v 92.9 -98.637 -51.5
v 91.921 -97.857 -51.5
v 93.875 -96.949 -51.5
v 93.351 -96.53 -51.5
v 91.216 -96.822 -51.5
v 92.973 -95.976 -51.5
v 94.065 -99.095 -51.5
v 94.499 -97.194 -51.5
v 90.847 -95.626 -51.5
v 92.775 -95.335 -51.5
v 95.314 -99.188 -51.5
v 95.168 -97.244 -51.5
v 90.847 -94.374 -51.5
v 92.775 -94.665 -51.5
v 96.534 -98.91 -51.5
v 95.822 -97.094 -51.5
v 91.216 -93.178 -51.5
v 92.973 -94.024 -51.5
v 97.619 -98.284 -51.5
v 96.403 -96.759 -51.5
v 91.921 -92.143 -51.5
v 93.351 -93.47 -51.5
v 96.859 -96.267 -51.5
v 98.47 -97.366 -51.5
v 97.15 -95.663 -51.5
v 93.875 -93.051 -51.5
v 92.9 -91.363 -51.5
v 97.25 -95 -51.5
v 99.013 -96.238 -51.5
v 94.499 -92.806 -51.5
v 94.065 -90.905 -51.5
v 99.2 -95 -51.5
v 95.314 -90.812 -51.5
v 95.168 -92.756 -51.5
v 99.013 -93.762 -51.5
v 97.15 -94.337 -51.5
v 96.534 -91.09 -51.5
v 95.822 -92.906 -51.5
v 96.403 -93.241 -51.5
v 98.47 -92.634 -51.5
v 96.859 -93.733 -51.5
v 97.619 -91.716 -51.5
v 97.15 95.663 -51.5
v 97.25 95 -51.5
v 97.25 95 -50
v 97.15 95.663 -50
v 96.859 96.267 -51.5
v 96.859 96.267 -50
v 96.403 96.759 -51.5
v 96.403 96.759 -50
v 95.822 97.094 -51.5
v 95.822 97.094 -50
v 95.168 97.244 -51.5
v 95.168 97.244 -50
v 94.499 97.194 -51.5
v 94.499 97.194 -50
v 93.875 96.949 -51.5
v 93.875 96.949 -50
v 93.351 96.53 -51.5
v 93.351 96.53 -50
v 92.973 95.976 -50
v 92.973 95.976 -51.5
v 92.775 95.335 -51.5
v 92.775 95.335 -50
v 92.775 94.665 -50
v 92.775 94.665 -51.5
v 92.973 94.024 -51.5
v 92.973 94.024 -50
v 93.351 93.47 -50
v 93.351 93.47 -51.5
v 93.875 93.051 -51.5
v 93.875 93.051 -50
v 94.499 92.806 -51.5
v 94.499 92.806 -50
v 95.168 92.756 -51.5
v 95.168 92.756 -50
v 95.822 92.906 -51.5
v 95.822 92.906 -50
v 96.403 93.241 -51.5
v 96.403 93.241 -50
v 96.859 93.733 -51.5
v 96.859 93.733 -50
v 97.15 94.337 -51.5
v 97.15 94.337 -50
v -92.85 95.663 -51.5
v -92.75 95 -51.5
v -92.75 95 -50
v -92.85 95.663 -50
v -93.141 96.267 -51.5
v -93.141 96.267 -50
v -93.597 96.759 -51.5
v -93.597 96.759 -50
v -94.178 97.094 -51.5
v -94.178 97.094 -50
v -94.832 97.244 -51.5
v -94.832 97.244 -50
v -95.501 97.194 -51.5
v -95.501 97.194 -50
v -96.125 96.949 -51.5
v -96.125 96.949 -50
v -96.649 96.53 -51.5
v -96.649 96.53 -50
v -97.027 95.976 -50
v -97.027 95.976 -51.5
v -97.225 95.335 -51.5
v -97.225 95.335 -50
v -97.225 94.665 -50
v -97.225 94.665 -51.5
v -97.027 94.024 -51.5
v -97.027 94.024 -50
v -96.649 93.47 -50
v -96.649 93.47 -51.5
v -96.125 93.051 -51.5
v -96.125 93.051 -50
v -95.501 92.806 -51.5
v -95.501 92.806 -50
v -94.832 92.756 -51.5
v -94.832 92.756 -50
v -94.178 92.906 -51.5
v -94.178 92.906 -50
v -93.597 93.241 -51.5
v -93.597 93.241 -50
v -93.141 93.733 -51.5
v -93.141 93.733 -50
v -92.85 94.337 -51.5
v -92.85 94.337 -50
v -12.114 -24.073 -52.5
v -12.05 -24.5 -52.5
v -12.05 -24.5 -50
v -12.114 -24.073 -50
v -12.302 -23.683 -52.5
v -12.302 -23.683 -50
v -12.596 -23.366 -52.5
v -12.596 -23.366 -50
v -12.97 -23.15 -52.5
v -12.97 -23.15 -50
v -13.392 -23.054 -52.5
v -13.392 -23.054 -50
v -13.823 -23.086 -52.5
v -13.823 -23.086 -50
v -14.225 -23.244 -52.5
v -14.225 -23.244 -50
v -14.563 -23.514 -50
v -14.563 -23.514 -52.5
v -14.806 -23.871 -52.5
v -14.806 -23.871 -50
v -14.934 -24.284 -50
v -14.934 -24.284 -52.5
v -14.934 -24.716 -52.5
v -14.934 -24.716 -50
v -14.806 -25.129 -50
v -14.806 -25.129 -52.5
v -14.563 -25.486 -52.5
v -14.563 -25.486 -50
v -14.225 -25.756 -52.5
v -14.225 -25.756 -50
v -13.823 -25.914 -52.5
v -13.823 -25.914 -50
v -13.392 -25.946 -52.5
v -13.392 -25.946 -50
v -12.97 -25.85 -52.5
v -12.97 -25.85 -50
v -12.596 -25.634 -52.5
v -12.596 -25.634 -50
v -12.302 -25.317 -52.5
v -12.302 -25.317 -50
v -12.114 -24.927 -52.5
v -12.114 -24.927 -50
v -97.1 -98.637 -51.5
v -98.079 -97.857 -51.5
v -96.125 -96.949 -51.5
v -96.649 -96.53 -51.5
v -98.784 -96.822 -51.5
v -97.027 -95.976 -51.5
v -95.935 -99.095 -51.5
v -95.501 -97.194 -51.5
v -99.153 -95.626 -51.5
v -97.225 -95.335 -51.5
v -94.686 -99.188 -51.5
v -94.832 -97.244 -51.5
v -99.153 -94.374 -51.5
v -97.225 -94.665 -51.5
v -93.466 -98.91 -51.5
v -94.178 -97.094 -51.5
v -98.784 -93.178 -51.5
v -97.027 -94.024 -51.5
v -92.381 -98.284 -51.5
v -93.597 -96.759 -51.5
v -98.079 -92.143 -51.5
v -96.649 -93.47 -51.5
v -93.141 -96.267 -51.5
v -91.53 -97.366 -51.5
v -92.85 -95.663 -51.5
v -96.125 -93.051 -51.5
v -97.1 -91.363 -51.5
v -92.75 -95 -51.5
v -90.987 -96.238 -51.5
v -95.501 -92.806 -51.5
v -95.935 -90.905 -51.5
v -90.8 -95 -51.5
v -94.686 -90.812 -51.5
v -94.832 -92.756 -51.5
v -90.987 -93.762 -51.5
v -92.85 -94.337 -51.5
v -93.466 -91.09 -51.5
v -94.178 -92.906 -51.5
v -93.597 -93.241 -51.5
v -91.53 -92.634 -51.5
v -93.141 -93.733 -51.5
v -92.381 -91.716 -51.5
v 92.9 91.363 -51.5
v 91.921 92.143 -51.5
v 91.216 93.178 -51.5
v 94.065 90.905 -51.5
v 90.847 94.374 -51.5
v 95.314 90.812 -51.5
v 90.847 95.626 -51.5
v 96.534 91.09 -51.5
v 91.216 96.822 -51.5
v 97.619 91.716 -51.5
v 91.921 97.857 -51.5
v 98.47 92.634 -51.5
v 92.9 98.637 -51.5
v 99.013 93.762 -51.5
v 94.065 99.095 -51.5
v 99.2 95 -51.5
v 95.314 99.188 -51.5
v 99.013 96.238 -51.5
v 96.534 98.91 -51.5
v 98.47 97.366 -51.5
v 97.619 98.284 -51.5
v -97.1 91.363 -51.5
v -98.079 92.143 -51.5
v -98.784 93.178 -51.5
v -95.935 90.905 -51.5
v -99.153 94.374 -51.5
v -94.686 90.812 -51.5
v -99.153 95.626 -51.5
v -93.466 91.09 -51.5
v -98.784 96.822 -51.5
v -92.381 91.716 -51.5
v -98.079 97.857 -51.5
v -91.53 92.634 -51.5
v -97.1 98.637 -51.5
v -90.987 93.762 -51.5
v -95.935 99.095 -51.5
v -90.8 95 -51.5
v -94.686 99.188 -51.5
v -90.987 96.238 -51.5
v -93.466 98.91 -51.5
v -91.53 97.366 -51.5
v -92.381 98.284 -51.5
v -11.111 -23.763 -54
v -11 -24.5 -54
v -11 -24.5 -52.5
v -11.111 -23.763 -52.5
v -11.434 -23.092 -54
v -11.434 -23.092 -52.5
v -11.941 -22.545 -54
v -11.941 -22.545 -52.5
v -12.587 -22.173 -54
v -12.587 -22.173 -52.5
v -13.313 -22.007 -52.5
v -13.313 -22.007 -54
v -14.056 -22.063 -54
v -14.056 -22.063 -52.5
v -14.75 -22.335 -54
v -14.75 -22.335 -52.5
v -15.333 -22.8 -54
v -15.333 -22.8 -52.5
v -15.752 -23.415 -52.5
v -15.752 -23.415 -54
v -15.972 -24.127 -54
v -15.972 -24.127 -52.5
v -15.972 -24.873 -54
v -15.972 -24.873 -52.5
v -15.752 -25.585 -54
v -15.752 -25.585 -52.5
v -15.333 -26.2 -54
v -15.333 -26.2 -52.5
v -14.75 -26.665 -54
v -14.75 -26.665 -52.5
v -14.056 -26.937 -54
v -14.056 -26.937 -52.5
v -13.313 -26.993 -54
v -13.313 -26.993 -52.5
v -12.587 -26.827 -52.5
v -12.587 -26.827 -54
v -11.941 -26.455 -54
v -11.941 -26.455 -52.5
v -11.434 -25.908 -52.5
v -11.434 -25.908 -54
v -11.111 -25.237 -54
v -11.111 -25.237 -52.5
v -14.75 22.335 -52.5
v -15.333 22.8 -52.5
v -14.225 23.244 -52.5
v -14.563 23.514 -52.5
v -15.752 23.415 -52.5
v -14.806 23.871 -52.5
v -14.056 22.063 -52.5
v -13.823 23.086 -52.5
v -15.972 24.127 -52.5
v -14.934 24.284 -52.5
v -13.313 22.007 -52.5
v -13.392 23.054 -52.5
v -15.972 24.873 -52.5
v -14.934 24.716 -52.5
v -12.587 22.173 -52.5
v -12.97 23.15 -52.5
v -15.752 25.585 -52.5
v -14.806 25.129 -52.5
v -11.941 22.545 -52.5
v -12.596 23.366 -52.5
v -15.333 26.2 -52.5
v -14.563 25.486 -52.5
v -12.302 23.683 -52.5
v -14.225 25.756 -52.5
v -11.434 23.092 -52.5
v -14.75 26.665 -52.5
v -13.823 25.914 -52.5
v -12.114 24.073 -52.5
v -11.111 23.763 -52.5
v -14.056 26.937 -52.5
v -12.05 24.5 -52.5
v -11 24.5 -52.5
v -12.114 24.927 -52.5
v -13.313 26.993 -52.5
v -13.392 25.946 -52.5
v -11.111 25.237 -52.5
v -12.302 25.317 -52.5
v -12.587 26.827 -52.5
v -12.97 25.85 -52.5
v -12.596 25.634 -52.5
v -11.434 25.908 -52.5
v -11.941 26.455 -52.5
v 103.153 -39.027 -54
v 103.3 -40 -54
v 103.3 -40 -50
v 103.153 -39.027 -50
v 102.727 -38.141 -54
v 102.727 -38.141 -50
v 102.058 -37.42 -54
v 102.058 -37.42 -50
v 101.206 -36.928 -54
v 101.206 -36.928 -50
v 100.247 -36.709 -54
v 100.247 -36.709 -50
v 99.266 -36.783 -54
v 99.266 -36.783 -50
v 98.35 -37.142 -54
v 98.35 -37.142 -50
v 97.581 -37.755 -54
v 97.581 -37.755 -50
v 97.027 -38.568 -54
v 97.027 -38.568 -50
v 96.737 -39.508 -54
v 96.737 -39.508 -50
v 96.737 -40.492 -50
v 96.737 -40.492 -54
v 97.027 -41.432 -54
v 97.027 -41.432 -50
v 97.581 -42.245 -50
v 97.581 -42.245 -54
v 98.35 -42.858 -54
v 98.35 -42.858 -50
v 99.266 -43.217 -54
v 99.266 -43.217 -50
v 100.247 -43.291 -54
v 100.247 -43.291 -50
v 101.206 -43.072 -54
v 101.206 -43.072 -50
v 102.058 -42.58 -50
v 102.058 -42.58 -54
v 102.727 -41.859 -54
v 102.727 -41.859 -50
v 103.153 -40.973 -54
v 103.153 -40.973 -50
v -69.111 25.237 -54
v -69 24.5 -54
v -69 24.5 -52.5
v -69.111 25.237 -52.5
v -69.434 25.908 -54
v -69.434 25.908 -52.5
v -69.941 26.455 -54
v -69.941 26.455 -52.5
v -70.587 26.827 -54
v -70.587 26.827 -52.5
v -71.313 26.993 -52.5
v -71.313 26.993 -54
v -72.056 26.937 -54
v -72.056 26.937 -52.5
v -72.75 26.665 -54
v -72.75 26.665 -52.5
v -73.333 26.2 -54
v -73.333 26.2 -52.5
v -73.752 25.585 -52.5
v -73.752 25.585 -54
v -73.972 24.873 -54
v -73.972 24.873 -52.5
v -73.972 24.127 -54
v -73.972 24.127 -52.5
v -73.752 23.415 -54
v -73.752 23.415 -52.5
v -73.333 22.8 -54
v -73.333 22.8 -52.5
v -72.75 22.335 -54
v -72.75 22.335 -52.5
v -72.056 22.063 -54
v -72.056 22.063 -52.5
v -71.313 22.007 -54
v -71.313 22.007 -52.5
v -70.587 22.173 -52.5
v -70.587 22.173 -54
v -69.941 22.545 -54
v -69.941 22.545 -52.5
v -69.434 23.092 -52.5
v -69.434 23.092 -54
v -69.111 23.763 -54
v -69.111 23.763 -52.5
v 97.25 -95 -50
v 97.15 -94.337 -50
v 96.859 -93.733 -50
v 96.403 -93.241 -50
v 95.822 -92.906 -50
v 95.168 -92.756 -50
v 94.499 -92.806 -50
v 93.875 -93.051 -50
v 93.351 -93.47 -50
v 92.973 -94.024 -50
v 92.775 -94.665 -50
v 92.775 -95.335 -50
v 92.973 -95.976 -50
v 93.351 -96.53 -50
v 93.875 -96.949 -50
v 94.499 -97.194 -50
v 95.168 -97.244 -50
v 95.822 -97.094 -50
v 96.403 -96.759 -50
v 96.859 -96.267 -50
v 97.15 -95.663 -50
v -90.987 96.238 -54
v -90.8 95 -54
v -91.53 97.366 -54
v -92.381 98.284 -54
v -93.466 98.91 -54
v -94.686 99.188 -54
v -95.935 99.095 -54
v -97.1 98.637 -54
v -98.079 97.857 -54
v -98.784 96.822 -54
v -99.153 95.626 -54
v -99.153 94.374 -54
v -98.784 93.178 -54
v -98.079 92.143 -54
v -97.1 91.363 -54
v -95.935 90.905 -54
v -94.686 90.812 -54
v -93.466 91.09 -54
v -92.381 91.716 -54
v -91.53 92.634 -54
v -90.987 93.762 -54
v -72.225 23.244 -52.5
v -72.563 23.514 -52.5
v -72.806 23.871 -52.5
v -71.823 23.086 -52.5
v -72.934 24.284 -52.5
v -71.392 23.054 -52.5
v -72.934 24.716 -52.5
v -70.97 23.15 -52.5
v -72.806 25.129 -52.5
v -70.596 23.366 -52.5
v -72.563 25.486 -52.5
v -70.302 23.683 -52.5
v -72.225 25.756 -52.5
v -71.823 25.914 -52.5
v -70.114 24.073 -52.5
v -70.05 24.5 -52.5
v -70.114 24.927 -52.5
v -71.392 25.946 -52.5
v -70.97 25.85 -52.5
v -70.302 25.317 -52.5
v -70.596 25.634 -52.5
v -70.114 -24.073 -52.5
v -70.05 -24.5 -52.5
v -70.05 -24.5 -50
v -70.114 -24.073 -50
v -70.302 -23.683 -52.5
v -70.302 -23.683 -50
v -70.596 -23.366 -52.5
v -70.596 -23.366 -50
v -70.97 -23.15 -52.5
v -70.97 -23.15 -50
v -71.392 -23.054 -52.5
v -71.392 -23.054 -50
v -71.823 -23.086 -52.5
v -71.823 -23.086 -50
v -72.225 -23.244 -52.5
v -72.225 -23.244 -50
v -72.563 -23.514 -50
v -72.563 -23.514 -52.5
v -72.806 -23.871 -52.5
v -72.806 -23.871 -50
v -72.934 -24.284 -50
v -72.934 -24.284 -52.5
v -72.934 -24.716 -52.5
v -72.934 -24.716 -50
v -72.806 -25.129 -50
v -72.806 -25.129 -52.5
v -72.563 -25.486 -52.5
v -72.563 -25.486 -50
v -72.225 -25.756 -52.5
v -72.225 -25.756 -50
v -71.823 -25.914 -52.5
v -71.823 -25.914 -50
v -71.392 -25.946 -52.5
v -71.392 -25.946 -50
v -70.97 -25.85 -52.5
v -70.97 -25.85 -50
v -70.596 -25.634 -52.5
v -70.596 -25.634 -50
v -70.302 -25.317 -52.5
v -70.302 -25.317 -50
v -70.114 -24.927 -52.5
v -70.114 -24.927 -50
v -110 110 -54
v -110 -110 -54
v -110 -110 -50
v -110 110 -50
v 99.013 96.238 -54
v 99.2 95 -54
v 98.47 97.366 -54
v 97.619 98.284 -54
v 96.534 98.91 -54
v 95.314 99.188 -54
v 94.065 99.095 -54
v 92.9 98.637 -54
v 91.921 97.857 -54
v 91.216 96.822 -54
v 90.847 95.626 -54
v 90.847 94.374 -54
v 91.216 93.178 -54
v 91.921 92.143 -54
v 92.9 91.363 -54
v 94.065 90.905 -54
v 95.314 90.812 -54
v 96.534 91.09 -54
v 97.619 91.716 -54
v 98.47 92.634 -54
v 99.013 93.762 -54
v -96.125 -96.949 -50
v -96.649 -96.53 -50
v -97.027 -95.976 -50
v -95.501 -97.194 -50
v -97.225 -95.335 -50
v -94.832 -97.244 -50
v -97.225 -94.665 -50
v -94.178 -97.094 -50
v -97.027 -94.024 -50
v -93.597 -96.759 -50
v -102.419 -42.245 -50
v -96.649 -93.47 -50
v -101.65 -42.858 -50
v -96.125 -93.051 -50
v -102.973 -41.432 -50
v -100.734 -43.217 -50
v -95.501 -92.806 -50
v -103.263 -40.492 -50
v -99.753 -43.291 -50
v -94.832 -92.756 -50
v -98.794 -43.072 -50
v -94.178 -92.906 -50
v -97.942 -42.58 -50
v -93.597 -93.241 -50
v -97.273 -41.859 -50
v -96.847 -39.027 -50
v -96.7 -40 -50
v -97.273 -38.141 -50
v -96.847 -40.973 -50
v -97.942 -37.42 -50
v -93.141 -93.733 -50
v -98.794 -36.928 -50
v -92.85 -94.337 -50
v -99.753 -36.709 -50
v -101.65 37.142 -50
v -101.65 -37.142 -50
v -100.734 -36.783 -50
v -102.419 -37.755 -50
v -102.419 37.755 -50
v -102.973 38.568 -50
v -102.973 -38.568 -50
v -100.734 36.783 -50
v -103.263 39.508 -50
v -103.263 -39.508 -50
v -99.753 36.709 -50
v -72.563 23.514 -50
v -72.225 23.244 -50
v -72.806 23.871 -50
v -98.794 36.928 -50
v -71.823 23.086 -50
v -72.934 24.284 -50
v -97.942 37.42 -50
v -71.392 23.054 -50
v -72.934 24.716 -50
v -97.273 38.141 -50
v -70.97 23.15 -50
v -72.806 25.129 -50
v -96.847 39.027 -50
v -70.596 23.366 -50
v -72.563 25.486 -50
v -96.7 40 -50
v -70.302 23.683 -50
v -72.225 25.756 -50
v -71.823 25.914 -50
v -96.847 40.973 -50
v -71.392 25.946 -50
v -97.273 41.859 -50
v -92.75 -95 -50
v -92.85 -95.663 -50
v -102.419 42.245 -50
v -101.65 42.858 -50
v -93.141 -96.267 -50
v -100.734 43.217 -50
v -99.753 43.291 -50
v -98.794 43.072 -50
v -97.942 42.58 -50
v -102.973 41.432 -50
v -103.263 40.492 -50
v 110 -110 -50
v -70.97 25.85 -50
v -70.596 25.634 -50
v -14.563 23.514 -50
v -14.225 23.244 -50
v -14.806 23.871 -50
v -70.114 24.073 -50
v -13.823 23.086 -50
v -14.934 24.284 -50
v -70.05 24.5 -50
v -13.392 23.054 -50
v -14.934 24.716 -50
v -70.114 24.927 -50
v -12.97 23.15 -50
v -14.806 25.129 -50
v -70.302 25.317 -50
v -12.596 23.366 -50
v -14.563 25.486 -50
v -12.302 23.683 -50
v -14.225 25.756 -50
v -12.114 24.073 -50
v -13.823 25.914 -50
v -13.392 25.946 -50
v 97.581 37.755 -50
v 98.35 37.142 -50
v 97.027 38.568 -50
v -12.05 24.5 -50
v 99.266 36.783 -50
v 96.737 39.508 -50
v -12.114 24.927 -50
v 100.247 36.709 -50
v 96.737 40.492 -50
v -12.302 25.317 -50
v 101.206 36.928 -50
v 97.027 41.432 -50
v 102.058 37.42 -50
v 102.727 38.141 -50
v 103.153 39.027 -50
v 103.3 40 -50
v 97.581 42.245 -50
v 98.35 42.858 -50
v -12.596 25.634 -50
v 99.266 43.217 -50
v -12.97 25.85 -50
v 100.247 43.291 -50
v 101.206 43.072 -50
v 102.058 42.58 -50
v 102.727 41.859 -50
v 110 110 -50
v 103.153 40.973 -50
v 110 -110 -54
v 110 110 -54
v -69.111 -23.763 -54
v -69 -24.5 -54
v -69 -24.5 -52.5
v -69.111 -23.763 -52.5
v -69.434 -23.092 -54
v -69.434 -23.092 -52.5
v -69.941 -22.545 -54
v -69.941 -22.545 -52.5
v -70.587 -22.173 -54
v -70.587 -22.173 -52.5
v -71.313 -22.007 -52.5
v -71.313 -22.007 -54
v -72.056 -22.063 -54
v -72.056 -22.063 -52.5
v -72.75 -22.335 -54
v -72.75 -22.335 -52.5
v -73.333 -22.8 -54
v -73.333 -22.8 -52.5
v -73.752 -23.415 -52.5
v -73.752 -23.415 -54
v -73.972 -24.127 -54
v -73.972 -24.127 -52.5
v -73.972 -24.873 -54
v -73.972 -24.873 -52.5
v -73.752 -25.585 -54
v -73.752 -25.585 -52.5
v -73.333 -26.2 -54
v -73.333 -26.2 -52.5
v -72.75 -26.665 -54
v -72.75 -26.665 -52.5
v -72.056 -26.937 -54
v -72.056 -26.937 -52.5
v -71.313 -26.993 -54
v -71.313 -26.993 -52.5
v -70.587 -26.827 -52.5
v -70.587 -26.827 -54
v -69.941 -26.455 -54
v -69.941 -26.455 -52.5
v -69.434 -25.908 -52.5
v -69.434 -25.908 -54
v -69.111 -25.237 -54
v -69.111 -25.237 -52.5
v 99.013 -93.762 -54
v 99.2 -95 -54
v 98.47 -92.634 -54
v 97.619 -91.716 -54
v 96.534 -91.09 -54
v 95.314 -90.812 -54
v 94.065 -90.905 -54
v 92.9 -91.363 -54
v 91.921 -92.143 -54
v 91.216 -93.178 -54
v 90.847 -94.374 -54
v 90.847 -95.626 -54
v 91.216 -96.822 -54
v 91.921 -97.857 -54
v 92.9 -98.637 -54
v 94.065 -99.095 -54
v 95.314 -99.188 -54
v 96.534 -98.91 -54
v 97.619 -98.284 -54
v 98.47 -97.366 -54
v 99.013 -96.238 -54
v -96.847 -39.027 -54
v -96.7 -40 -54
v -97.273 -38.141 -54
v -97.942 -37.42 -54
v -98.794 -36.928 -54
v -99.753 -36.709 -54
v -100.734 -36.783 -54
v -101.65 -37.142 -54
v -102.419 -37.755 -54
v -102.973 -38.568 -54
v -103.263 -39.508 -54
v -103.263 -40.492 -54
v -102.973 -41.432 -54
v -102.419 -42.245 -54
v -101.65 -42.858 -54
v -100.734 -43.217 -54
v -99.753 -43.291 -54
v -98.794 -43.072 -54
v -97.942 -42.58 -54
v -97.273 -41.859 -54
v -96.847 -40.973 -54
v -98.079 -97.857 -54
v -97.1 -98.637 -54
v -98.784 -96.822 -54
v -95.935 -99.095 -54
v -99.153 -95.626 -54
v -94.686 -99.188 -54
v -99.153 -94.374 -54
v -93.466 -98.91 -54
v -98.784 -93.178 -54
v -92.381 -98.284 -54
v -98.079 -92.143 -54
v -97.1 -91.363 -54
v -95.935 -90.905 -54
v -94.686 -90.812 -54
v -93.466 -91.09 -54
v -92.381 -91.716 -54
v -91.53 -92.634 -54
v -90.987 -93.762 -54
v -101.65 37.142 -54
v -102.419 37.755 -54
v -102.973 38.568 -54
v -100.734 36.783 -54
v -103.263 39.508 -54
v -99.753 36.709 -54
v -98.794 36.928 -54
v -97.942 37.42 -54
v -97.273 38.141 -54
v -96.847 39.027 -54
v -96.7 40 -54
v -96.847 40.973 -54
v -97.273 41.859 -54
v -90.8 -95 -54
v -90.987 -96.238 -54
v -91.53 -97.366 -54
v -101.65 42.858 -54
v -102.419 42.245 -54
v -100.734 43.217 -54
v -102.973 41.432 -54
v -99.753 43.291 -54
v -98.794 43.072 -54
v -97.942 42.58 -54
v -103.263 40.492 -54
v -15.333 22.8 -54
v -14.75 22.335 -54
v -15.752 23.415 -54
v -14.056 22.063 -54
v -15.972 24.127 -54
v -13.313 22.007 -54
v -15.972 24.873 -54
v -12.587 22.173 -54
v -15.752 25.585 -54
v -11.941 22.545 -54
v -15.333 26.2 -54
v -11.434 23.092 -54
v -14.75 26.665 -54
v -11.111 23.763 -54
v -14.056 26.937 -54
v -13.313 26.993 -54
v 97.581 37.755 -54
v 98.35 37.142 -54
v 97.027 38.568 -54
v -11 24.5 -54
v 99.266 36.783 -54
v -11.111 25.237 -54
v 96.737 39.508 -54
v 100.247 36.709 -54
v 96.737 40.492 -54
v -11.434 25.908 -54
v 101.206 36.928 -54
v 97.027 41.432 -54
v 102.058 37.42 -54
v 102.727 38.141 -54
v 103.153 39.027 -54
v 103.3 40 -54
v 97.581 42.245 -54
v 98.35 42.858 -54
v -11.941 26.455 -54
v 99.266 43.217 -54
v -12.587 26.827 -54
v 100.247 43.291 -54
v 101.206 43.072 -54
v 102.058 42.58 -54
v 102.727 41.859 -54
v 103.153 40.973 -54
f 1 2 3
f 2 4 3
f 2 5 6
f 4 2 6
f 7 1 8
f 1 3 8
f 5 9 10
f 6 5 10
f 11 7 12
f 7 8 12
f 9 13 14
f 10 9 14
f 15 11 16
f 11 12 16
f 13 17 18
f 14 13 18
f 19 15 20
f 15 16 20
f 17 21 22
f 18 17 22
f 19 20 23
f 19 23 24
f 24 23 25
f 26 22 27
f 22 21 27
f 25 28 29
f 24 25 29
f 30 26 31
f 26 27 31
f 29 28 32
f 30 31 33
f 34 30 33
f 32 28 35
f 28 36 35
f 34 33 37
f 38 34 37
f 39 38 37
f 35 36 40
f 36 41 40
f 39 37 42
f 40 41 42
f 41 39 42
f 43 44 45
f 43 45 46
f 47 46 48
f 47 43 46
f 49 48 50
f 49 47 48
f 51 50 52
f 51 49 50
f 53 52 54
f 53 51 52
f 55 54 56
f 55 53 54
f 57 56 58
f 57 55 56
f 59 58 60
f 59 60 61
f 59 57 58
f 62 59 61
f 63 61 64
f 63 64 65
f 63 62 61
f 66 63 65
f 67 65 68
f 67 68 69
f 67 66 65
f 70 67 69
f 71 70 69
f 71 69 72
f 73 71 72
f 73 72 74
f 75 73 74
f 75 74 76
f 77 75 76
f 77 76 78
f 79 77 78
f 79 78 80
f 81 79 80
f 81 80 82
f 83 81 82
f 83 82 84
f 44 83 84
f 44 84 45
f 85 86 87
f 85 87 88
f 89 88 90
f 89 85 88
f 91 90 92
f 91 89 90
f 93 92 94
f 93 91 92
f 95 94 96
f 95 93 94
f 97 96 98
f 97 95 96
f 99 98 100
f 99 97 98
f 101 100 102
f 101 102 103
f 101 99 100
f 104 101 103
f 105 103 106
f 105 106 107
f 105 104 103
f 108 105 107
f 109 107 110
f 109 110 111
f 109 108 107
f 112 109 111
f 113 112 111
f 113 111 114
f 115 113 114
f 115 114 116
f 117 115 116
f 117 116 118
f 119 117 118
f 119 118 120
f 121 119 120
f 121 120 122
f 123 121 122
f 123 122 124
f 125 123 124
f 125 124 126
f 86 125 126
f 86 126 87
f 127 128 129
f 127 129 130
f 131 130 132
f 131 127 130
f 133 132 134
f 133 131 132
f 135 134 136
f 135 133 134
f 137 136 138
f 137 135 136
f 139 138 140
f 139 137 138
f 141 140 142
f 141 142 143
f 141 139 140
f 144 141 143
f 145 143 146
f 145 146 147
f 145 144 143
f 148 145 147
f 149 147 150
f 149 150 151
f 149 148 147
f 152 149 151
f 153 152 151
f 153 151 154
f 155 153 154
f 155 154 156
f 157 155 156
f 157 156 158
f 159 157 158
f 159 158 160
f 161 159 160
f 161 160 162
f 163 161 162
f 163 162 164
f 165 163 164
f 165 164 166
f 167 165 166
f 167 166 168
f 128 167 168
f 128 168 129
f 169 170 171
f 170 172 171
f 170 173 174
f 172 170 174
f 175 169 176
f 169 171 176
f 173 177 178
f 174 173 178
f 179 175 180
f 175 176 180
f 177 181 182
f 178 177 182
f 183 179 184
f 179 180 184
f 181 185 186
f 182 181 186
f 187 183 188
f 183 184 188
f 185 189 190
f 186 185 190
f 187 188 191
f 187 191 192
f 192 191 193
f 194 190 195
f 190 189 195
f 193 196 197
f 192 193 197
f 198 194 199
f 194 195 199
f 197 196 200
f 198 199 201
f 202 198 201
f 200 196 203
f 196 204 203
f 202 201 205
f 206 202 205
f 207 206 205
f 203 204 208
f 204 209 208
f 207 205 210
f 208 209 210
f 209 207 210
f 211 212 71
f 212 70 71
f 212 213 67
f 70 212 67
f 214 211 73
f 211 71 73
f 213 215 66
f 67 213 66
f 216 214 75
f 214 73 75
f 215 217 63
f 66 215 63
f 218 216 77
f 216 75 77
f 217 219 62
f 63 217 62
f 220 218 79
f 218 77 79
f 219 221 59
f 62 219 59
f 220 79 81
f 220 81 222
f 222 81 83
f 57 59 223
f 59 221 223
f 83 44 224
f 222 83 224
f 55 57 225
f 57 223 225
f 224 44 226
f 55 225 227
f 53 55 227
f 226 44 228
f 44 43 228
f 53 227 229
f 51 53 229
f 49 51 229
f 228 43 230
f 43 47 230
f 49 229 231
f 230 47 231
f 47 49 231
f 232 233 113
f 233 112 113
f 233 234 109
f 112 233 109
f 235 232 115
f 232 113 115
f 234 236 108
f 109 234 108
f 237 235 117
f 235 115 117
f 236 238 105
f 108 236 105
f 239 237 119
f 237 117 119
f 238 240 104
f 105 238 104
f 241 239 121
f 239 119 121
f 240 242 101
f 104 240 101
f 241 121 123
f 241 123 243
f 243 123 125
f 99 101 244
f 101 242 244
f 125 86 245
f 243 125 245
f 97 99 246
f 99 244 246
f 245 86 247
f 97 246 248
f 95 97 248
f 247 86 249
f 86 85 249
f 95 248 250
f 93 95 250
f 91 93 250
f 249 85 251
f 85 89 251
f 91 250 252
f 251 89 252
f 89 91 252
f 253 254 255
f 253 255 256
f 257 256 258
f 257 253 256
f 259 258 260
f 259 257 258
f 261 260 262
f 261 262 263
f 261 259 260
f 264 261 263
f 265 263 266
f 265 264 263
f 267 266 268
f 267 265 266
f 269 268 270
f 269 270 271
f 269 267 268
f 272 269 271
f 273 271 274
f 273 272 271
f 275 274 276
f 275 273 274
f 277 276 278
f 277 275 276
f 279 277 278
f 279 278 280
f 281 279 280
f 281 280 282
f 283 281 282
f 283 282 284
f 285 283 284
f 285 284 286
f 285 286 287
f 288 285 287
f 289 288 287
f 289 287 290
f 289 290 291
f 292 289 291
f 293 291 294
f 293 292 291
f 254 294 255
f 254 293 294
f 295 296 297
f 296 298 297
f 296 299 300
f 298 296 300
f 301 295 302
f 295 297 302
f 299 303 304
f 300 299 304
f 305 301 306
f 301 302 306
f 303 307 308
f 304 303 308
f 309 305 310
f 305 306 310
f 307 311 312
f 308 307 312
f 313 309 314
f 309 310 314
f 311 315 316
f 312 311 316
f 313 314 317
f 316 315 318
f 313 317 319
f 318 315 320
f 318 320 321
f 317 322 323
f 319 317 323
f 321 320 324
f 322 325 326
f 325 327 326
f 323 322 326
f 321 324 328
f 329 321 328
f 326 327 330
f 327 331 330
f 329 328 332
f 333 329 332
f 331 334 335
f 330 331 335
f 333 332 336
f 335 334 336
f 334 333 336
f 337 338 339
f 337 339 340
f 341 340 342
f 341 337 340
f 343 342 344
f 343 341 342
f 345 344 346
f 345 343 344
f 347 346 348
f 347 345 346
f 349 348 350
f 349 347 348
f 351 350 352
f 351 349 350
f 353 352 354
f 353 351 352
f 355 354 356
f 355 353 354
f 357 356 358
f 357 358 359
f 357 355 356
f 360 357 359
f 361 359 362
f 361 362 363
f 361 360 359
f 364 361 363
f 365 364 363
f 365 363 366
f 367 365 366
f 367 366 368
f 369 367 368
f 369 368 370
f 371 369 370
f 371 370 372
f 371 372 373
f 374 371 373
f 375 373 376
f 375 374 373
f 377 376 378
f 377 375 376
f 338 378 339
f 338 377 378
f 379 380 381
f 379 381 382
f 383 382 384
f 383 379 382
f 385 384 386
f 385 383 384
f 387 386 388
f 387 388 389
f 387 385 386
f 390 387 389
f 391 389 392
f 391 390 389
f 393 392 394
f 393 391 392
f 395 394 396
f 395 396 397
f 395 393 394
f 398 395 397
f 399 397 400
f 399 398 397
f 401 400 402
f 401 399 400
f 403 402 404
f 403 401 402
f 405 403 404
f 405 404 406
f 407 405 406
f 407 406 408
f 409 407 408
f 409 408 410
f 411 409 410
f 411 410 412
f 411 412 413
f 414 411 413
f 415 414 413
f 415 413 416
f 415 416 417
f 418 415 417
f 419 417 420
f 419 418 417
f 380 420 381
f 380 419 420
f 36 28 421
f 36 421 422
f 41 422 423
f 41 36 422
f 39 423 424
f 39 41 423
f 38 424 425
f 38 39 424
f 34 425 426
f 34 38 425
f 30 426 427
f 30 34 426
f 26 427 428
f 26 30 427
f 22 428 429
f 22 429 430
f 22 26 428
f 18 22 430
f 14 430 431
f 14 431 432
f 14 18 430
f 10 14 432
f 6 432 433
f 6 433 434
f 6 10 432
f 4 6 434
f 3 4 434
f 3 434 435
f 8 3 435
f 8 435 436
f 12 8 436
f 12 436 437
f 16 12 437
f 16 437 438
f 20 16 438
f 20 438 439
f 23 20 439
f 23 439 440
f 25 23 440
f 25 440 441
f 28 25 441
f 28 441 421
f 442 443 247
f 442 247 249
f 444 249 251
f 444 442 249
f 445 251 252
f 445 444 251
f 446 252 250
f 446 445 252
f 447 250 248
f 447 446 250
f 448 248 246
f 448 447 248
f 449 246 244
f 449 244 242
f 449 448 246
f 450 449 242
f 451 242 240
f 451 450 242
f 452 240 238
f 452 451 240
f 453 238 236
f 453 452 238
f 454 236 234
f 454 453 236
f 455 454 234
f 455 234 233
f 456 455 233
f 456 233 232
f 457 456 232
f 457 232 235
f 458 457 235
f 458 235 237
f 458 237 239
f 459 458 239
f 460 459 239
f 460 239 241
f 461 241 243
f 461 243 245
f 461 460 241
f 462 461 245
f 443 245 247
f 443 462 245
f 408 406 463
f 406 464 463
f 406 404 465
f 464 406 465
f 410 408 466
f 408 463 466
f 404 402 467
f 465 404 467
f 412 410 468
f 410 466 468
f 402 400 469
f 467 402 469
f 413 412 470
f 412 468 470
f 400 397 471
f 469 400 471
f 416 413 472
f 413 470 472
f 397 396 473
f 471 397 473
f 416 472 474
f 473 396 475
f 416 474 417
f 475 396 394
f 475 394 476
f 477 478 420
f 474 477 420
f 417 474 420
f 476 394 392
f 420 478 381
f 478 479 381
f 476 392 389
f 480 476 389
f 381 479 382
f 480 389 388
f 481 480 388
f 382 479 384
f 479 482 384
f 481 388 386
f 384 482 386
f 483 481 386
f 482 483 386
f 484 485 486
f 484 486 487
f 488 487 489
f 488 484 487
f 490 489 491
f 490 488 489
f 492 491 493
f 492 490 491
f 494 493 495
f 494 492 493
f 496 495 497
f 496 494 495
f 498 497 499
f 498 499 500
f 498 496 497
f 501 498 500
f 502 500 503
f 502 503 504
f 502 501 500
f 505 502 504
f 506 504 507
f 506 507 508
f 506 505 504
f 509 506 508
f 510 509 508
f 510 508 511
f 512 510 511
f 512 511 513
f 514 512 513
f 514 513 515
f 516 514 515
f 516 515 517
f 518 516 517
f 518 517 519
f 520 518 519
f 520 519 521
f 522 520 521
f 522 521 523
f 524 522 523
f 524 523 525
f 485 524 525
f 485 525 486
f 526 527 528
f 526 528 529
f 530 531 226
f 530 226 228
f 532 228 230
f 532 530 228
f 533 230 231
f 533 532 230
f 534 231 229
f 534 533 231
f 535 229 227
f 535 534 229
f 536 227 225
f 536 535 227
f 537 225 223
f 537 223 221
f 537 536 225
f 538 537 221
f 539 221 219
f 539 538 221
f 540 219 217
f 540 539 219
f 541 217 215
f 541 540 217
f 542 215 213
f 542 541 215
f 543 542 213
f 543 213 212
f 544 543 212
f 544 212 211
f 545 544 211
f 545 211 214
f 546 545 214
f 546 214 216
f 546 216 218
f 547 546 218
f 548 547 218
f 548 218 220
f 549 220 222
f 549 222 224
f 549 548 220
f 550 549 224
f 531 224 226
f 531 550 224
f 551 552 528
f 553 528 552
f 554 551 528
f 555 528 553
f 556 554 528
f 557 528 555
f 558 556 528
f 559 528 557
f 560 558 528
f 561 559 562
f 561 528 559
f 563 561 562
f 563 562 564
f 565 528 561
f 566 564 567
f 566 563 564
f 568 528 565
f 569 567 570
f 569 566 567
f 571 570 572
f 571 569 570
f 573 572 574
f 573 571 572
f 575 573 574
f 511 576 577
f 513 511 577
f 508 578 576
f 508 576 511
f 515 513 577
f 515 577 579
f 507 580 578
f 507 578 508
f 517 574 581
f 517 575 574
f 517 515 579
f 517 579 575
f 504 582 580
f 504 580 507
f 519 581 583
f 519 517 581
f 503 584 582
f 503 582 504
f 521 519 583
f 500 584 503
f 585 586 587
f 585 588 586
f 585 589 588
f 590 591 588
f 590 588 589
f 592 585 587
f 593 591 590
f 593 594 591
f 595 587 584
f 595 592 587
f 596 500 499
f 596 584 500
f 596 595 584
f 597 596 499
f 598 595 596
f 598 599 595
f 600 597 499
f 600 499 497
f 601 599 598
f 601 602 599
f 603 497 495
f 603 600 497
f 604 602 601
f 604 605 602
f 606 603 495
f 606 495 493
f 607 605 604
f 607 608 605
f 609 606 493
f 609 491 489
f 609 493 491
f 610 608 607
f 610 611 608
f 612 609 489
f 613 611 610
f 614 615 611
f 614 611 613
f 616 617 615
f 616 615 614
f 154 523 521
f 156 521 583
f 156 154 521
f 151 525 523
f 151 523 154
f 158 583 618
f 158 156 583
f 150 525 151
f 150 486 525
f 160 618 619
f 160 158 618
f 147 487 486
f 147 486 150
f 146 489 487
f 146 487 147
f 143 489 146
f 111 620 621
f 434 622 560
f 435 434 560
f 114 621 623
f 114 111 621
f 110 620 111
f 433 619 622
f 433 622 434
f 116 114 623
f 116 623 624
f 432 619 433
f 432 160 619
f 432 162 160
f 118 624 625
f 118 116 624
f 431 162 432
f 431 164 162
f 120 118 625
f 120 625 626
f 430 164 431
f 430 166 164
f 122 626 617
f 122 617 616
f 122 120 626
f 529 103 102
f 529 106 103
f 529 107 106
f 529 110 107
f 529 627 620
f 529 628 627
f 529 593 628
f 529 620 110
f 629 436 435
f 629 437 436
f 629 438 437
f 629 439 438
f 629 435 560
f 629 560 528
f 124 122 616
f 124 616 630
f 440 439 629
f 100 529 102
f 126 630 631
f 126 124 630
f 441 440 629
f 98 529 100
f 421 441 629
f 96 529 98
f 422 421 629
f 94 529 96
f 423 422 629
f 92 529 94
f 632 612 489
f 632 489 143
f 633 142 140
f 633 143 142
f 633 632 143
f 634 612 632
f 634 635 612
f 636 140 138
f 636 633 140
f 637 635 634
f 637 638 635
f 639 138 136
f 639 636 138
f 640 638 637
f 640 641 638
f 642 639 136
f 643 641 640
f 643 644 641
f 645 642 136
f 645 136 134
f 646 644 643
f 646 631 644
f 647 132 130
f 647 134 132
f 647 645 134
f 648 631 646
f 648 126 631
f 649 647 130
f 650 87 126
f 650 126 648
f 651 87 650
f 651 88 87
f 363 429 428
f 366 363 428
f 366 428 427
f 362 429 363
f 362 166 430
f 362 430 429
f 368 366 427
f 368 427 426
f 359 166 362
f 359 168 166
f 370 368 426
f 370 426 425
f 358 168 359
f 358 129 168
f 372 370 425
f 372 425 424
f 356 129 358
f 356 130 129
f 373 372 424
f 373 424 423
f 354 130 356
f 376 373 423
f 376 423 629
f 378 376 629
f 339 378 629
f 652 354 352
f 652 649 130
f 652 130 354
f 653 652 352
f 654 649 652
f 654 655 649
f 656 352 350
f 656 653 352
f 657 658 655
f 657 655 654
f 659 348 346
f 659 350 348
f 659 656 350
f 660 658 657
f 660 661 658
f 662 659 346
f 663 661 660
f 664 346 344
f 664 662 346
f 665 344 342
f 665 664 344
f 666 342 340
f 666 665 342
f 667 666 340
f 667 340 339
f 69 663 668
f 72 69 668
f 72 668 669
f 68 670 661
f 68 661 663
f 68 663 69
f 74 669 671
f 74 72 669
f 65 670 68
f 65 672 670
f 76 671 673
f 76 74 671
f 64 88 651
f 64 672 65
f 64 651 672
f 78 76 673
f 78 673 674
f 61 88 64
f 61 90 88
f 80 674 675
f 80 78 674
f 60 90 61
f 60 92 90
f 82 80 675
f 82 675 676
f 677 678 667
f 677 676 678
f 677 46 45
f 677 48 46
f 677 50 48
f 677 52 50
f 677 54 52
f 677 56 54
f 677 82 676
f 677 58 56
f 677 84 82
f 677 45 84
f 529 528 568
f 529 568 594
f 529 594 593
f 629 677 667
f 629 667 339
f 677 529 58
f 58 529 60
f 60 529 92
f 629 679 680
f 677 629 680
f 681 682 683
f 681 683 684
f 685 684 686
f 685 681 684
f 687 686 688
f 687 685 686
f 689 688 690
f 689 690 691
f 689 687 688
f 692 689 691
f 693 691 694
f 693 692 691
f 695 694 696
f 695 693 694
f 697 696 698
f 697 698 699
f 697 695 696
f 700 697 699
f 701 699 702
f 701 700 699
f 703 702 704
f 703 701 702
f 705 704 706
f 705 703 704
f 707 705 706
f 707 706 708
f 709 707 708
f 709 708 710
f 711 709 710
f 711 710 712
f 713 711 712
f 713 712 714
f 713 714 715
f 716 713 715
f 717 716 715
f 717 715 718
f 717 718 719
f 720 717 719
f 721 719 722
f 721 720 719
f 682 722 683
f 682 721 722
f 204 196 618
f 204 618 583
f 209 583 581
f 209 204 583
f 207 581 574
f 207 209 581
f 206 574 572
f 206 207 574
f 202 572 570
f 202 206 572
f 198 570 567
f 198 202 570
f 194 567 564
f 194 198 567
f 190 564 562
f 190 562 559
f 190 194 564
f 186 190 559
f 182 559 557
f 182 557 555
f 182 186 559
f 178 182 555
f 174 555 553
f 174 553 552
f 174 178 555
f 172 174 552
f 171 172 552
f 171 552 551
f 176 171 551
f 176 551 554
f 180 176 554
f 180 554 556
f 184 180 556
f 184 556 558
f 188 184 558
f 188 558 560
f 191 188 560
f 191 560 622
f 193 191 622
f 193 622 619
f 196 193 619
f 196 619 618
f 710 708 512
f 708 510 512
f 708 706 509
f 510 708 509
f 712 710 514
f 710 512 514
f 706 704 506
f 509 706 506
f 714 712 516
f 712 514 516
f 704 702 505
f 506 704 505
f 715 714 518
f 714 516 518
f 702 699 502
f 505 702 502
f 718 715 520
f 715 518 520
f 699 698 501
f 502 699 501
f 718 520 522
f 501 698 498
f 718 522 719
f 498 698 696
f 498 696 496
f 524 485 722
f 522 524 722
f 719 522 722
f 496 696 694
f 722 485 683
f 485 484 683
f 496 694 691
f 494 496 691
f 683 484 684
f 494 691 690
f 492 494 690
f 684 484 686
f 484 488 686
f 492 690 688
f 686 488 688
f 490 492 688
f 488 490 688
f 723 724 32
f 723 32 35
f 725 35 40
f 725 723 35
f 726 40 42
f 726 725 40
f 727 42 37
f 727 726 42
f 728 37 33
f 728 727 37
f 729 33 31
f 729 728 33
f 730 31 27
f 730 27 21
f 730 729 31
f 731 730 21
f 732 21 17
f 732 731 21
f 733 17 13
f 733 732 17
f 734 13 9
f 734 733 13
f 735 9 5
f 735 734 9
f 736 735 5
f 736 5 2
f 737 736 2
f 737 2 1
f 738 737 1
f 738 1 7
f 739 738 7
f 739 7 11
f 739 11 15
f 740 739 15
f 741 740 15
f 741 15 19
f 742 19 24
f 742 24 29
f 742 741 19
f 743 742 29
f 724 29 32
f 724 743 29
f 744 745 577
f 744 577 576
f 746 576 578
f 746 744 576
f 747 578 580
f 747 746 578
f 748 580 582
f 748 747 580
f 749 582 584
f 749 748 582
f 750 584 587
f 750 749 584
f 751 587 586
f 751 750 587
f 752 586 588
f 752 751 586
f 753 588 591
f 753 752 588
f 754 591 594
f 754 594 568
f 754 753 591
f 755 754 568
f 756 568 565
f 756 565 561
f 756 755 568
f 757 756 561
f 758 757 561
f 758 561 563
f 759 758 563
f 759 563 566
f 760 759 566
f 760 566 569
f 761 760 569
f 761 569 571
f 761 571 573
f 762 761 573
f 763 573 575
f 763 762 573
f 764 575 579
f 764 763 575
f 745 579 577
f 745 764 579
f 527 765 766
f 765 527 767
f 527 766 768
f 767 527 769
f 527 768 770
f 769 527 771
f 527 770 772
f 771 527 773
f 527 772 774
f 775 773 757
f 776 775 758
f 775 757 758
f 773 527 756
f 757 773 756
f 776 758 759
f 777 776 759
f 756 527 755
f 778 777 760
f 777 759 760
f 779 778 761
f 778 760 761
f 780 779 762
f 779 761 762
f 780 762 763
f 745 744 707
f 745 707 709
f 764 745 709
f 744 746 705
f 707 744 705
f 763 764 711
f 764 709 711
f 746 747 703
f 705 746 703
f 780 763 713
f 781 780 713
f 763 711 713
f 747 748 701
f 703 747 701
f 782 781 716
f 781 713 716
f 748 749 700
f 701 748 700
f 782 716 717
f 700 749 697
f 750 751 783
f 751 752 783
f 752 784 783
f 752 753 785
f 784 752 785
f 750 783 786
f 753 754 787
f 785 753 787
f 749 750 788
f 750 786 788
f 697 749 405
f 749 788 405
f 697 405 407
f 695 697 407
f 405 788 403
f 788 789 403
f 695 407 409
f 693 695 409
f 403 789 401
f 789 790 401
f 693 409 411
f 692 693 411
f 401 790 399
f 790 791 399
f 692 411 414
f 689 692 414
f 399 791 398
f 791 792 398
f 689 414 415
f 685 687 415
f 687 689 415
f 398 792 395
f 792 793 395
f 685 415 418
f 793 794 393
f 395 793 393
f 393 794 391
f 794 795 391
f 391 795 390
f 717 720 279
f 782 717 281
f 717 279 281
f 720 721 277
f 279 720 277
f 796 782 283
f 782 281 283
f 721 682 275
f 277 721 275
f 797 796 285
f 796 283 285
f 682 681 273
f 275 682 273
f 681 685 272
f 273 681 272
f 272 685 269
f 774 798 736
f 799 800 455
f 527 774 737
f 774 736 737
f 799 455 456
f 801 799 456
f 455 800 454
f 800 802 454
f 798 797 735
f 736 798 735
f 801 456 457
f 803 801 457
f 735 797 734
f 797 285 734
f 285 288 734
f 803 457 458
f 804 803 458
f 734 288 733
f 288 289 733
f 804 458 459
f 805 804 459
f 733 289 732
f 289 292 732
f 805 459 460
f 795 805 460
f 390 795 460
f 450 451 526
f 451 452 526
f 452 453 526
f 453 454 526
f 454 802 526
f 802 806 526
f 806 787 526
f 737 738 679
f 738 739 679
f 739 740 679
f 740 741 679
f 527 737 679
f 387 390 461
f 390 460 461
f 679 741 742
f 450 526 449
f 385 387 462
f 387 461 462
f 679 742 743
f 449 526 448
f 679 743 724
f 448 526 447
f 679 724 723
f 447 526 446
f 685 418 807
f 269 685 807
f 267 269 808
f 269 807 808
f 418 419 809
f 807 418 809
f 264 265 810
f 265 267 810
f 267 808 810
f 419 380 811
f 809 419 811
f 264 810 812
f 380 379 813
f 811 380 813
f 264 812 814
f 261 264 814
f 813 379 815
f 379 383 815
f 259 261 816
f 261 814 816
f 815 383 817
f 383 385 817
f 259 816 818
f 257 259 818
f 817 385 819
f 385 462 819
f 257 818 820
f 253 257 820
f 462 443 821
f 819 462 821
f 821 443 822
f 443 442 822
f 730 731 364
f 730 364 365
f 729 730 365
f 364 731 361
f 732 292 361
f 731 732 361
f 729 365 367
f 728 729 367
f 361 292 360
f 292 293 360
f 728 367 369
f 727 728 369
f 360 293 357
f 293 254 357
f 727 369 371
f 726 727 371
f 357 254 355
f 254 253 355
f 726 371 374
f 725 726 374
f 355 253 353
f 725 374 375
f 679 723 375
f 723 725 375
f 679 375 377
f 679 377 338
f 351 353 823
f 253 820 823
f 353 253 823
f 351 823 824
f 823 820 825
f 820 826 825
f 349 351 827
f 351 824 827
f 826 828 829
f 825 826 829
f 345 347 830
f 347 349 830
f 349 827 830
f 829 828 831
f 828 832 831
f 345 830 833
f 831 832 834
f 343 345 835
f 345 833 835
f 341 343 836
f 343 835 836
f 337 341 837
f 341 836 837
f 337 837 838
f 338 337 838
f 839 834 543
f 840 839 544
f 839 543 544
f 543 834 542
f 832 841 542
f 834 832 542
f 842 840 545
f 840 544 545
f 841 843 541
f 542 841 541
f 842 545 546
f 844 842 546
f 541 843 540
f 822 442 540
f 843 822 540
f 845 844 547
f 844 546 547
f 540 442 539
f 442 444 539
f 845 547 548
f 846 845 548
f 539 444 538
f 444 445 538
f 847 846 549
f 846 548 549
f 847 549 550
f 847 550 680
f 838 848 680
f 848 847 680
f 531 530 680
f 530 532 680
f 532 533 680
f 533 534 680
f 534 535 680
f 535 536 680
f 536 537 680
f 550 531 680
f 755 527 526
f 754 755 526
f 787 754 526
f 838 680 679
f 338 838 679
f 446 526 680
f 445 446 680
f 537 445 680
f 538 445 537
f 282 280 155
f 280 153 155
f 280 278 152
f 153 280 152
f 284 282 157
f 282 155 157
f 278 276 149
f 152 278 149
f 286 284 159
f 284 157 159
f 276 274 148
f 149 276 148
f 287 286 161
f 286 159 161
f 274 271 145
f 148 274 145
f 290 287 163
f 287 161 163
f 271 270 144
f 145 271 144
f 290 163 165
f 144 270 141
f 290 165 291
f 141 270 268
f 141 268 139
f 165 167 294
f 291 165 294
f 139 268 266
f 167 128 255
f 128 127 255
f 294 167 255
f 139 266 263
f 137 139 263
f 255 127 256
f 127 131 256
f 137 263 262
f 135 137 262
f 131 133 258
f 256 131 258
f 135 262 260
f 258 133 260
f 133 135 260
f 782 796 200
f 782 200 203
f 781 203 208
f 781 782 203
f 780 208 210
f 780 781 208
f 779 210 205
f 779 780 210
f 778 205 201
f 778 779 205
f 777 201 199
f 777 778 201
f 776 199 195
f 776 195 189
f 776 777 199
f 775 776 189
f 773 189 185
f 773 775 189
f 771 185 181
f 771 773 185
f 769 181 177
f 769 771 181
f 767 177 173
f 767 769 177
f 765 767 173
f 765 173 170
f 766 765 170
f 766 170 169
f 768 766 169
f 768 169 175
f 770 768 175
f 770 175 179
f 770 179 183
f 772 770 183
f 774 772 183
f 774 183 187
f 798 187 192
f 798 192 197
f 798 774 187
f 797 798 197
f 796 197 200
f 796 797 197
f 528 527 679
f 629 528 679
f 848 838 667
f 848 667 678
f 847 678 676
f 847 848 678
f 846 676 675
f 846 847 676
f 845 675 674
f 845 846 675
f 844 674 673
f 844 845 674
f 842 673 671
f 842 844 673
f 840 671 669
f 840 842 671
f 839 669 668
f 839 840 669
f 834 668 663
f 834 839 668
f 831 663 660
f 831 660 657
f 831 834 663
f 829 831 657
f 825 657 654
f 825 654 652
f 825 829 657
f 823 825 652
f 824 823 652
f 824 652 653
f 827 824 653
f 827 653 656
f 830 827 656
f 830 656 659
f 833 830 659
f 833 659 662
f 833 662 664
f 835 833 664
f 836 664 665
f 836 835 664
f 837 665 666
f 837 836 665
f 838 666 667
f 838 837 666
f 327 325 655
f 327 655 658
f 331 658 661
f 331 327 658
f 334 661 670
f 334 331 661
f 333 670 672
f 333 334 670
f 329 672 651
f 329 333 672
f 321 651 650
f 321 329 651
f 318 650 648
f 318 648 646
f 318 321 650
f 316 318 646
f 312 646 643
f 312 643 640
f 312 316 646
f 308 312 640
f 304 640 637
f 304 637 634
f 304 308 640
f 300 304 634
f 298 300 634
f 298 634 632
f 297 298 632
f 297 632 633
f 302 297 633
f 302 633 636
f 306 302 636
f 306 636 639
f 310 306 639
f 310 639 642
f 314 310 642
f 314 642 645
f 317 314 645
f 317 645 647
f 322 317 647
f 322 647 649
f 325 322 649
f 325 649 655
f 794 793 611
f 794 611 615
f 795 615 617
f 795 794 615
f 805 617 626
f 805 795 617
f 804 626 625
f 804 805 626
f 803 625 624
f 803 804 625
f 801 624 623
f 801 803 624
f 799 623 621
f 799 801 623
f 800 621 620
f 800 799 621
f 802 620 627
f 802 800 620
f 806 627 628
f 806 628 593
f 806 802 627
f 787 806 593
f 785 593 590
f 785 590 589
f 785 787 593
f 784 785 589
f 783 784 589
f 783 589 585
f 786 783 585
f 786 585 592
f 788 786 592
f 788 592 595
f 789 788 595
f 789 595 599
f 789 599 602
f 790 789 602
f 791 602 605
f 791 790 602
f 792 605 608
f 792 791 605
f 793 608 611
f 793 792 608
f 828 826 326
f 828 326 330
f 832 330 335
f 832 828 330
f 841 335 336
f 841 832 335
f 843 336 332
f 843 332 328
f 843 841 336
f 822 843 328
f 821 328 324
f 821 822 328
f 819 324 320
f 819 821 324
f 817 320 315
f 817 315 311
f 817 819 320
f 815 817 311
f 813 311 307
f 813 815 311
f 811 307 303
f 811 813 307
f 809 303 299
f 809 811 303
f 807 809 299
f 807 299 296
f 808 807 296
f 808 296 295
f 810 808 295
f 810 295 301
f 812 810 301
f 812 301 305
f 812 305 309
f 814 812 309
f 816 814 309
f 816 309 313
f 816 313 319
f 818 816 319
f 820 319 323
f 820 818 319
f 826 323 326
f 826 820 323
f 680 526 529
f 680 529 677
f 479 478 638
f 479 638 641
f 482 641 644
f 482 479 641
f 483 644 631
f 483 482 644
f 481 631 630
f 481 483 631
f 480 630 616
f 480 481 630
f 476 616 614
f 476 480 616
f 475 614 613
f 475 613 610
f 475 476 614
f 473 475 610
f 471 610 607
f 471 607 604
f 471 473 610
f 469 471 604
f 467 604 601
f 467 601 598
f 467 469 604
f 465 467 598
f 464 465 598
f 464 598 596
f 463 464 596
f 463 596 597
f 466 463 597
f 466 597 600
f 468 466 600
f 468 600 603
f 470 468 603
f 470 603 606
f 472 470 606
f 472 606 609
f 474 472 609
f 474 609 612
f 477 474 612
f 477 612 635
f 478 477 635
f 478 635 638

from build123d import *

# Parameters (mm, degrees)
FONDO_START                   = -54
SK_FONDO_W                    = 220
SK_FONDO_H                    = 220
FONDO_DEPTH                   = 4
PASANTES_M4_SEPARADORES_START = -54
SK_PASANTES_M4_SEPARADORES_R  = 2.25
PASANTES_M4_SEPARADORES_DEPTH = 4
AVELLANADO_M4_START           = -54
SK_AVELLANADO_M4_R            = 4.2
AVELLANADO_M4_DEPTH           = 2.5
PASANTES_M2_5_RPI_START       = -54
SK_PASANTES_M2_5_RPI_R        = 1.45
PASANTES_M2_5_RPI_DEPTH       = 4
AVELLANADO_M2_5_START         = -54
SK_AVELLANADO_M2_5_R          = 2.5
AVELLANADO_M2_5_DEPTH         = 1.5
AGUJEROS_ANCLAJE_START        = -54
SK_AGUJEROS_ANCLAJE_R         = 3.3
AGUJEROS_ANCLAJE_DEPTH        = 4


with BuildPart() as part:
    # Sk_Fondo → Fondo (new body)
    with BuildSketch(Plane.XY.offset(FONDO_START)):
        Rectangle(SK_FONDO_W, SK_FONDO_H)
    extrude(amount=FONDO_DEPTH)

    # Sk_Pasantes_M4_separadores → Pasantes_M4_separadores (cut)
    with BuildSketch(Plane.XY.offset(PASANTES_M4_SEPARADORES_START)):
        with Locations((-95, -95)):
            Circle(SK_PASANTES_M4_SEPARADORES_R)
        with Locations((-95, 95)):
            Circle(SK_PASANTES_M4_SEPARADORES_R)
        with Locations((95, -95)):
            Circle(SK_PASANTES_M4_SEPARADORES_R)
        with Locations((95, 95)):
            Circle(SK_PASANTES_M4_SEPARADORES_R)
    extrude(amount=PASANTES_M4_SEPARADORES_DEPTH, mode=Mode.SUBTRACT)

    # Sk_Avellanado_M4 → Avellanado_M4 (cut)
    with BuildSketch(Plane.XY.offset(AVELLANADO_M4_START)):
        with Locations((-95, -95)):
            Circle(SK_AVELLANADO_M4_R)
        with Locations((-95, 95)):
            Circle(SK_AVELLANADO_M4_R)
        with Locations((95, -95)):
            Circle(SK_AVELLANADO_M4_R)
        with Locations((95, 95)):
            Circle(SK_AVELLANADO_M4_R)
    extrude(amount=AVELLANADO_M4_DEPTH, mode=Mode.SUBTRACT)

    # Sk_Pasantes_M2-5_RPi → Pasantes_M2-5_RPi (cut)
    with BuildSketch(Plane.XY.offset(PASANTES_M2_5_RPI_START)):
        with Locations((-13.5, -24.5)):
            Circle(SK_PASANTES_M2_5_RPI_R)
        with Locations((-13.5, 24.5)):
            Circle(SK_PASANTES_M2_5_RPI_R)
        with Locations((-71.5, -24.5)):
            Circle(SK_PASANTES_M2_5_RPI_R)
        with Locations((-71.5, 24.5)):
            Circle(SK_PASANTES_M2_5_RPI_R)
    extrude(amount=PASANTES_M2_5_RPI_DEPTH, mode=Mode.SUBTRACT)

    # Sk_Avellanado_M2-5 → Avellanado_M2-5 (cut)
    with BuildSketch(Plane.XY.offset(AVELLANADO_M2_5_START)):
        with Locations((-13.5, -24.5)):
            Circle(SK_AVELLANADO_M2_5_R)
        with Locations((-13.5, 24.5)):
            Circle(SK_AVELLANADO_M2_5_R)
        with Locations((-71.5, -24.5)):
            Circle(SK_AVELLANADO_M2_5_R)
        with Locations((-71.5, 24.5)):
            Circle(SK_AVELLANADO_M2_5_R)
    extrude(amount=AVELLANADO_M2_5_DEPTH, mode=Mode.SUBTRACT)

    # Sk_Agujeros_anclaje → Agujeros_anclaje (cut)
    with BuildSketch(Plane.XY.offset(AGUJEROS_ANCLAJE_START)):
        with Locations((-100, -40)):
            Circle(SK_AGUJEROS_ANCLAJE_R)
        with Locations((-100, 40)):
            Circle(SK_AGUJEROS_ANCLAJE_R)
        with Locations((100, -40)):
            Circle(SK_AGUJEROS_ANCLAJE_R)
        with Locations((100, 40)):
            Circle(SK_AGUJEROS_ANCLAJE_R)
    extrude(amount=AGUJEROS_ANCLAJE_DEPTH, mode=Mode.SUBTRACT)


solid = part.part
